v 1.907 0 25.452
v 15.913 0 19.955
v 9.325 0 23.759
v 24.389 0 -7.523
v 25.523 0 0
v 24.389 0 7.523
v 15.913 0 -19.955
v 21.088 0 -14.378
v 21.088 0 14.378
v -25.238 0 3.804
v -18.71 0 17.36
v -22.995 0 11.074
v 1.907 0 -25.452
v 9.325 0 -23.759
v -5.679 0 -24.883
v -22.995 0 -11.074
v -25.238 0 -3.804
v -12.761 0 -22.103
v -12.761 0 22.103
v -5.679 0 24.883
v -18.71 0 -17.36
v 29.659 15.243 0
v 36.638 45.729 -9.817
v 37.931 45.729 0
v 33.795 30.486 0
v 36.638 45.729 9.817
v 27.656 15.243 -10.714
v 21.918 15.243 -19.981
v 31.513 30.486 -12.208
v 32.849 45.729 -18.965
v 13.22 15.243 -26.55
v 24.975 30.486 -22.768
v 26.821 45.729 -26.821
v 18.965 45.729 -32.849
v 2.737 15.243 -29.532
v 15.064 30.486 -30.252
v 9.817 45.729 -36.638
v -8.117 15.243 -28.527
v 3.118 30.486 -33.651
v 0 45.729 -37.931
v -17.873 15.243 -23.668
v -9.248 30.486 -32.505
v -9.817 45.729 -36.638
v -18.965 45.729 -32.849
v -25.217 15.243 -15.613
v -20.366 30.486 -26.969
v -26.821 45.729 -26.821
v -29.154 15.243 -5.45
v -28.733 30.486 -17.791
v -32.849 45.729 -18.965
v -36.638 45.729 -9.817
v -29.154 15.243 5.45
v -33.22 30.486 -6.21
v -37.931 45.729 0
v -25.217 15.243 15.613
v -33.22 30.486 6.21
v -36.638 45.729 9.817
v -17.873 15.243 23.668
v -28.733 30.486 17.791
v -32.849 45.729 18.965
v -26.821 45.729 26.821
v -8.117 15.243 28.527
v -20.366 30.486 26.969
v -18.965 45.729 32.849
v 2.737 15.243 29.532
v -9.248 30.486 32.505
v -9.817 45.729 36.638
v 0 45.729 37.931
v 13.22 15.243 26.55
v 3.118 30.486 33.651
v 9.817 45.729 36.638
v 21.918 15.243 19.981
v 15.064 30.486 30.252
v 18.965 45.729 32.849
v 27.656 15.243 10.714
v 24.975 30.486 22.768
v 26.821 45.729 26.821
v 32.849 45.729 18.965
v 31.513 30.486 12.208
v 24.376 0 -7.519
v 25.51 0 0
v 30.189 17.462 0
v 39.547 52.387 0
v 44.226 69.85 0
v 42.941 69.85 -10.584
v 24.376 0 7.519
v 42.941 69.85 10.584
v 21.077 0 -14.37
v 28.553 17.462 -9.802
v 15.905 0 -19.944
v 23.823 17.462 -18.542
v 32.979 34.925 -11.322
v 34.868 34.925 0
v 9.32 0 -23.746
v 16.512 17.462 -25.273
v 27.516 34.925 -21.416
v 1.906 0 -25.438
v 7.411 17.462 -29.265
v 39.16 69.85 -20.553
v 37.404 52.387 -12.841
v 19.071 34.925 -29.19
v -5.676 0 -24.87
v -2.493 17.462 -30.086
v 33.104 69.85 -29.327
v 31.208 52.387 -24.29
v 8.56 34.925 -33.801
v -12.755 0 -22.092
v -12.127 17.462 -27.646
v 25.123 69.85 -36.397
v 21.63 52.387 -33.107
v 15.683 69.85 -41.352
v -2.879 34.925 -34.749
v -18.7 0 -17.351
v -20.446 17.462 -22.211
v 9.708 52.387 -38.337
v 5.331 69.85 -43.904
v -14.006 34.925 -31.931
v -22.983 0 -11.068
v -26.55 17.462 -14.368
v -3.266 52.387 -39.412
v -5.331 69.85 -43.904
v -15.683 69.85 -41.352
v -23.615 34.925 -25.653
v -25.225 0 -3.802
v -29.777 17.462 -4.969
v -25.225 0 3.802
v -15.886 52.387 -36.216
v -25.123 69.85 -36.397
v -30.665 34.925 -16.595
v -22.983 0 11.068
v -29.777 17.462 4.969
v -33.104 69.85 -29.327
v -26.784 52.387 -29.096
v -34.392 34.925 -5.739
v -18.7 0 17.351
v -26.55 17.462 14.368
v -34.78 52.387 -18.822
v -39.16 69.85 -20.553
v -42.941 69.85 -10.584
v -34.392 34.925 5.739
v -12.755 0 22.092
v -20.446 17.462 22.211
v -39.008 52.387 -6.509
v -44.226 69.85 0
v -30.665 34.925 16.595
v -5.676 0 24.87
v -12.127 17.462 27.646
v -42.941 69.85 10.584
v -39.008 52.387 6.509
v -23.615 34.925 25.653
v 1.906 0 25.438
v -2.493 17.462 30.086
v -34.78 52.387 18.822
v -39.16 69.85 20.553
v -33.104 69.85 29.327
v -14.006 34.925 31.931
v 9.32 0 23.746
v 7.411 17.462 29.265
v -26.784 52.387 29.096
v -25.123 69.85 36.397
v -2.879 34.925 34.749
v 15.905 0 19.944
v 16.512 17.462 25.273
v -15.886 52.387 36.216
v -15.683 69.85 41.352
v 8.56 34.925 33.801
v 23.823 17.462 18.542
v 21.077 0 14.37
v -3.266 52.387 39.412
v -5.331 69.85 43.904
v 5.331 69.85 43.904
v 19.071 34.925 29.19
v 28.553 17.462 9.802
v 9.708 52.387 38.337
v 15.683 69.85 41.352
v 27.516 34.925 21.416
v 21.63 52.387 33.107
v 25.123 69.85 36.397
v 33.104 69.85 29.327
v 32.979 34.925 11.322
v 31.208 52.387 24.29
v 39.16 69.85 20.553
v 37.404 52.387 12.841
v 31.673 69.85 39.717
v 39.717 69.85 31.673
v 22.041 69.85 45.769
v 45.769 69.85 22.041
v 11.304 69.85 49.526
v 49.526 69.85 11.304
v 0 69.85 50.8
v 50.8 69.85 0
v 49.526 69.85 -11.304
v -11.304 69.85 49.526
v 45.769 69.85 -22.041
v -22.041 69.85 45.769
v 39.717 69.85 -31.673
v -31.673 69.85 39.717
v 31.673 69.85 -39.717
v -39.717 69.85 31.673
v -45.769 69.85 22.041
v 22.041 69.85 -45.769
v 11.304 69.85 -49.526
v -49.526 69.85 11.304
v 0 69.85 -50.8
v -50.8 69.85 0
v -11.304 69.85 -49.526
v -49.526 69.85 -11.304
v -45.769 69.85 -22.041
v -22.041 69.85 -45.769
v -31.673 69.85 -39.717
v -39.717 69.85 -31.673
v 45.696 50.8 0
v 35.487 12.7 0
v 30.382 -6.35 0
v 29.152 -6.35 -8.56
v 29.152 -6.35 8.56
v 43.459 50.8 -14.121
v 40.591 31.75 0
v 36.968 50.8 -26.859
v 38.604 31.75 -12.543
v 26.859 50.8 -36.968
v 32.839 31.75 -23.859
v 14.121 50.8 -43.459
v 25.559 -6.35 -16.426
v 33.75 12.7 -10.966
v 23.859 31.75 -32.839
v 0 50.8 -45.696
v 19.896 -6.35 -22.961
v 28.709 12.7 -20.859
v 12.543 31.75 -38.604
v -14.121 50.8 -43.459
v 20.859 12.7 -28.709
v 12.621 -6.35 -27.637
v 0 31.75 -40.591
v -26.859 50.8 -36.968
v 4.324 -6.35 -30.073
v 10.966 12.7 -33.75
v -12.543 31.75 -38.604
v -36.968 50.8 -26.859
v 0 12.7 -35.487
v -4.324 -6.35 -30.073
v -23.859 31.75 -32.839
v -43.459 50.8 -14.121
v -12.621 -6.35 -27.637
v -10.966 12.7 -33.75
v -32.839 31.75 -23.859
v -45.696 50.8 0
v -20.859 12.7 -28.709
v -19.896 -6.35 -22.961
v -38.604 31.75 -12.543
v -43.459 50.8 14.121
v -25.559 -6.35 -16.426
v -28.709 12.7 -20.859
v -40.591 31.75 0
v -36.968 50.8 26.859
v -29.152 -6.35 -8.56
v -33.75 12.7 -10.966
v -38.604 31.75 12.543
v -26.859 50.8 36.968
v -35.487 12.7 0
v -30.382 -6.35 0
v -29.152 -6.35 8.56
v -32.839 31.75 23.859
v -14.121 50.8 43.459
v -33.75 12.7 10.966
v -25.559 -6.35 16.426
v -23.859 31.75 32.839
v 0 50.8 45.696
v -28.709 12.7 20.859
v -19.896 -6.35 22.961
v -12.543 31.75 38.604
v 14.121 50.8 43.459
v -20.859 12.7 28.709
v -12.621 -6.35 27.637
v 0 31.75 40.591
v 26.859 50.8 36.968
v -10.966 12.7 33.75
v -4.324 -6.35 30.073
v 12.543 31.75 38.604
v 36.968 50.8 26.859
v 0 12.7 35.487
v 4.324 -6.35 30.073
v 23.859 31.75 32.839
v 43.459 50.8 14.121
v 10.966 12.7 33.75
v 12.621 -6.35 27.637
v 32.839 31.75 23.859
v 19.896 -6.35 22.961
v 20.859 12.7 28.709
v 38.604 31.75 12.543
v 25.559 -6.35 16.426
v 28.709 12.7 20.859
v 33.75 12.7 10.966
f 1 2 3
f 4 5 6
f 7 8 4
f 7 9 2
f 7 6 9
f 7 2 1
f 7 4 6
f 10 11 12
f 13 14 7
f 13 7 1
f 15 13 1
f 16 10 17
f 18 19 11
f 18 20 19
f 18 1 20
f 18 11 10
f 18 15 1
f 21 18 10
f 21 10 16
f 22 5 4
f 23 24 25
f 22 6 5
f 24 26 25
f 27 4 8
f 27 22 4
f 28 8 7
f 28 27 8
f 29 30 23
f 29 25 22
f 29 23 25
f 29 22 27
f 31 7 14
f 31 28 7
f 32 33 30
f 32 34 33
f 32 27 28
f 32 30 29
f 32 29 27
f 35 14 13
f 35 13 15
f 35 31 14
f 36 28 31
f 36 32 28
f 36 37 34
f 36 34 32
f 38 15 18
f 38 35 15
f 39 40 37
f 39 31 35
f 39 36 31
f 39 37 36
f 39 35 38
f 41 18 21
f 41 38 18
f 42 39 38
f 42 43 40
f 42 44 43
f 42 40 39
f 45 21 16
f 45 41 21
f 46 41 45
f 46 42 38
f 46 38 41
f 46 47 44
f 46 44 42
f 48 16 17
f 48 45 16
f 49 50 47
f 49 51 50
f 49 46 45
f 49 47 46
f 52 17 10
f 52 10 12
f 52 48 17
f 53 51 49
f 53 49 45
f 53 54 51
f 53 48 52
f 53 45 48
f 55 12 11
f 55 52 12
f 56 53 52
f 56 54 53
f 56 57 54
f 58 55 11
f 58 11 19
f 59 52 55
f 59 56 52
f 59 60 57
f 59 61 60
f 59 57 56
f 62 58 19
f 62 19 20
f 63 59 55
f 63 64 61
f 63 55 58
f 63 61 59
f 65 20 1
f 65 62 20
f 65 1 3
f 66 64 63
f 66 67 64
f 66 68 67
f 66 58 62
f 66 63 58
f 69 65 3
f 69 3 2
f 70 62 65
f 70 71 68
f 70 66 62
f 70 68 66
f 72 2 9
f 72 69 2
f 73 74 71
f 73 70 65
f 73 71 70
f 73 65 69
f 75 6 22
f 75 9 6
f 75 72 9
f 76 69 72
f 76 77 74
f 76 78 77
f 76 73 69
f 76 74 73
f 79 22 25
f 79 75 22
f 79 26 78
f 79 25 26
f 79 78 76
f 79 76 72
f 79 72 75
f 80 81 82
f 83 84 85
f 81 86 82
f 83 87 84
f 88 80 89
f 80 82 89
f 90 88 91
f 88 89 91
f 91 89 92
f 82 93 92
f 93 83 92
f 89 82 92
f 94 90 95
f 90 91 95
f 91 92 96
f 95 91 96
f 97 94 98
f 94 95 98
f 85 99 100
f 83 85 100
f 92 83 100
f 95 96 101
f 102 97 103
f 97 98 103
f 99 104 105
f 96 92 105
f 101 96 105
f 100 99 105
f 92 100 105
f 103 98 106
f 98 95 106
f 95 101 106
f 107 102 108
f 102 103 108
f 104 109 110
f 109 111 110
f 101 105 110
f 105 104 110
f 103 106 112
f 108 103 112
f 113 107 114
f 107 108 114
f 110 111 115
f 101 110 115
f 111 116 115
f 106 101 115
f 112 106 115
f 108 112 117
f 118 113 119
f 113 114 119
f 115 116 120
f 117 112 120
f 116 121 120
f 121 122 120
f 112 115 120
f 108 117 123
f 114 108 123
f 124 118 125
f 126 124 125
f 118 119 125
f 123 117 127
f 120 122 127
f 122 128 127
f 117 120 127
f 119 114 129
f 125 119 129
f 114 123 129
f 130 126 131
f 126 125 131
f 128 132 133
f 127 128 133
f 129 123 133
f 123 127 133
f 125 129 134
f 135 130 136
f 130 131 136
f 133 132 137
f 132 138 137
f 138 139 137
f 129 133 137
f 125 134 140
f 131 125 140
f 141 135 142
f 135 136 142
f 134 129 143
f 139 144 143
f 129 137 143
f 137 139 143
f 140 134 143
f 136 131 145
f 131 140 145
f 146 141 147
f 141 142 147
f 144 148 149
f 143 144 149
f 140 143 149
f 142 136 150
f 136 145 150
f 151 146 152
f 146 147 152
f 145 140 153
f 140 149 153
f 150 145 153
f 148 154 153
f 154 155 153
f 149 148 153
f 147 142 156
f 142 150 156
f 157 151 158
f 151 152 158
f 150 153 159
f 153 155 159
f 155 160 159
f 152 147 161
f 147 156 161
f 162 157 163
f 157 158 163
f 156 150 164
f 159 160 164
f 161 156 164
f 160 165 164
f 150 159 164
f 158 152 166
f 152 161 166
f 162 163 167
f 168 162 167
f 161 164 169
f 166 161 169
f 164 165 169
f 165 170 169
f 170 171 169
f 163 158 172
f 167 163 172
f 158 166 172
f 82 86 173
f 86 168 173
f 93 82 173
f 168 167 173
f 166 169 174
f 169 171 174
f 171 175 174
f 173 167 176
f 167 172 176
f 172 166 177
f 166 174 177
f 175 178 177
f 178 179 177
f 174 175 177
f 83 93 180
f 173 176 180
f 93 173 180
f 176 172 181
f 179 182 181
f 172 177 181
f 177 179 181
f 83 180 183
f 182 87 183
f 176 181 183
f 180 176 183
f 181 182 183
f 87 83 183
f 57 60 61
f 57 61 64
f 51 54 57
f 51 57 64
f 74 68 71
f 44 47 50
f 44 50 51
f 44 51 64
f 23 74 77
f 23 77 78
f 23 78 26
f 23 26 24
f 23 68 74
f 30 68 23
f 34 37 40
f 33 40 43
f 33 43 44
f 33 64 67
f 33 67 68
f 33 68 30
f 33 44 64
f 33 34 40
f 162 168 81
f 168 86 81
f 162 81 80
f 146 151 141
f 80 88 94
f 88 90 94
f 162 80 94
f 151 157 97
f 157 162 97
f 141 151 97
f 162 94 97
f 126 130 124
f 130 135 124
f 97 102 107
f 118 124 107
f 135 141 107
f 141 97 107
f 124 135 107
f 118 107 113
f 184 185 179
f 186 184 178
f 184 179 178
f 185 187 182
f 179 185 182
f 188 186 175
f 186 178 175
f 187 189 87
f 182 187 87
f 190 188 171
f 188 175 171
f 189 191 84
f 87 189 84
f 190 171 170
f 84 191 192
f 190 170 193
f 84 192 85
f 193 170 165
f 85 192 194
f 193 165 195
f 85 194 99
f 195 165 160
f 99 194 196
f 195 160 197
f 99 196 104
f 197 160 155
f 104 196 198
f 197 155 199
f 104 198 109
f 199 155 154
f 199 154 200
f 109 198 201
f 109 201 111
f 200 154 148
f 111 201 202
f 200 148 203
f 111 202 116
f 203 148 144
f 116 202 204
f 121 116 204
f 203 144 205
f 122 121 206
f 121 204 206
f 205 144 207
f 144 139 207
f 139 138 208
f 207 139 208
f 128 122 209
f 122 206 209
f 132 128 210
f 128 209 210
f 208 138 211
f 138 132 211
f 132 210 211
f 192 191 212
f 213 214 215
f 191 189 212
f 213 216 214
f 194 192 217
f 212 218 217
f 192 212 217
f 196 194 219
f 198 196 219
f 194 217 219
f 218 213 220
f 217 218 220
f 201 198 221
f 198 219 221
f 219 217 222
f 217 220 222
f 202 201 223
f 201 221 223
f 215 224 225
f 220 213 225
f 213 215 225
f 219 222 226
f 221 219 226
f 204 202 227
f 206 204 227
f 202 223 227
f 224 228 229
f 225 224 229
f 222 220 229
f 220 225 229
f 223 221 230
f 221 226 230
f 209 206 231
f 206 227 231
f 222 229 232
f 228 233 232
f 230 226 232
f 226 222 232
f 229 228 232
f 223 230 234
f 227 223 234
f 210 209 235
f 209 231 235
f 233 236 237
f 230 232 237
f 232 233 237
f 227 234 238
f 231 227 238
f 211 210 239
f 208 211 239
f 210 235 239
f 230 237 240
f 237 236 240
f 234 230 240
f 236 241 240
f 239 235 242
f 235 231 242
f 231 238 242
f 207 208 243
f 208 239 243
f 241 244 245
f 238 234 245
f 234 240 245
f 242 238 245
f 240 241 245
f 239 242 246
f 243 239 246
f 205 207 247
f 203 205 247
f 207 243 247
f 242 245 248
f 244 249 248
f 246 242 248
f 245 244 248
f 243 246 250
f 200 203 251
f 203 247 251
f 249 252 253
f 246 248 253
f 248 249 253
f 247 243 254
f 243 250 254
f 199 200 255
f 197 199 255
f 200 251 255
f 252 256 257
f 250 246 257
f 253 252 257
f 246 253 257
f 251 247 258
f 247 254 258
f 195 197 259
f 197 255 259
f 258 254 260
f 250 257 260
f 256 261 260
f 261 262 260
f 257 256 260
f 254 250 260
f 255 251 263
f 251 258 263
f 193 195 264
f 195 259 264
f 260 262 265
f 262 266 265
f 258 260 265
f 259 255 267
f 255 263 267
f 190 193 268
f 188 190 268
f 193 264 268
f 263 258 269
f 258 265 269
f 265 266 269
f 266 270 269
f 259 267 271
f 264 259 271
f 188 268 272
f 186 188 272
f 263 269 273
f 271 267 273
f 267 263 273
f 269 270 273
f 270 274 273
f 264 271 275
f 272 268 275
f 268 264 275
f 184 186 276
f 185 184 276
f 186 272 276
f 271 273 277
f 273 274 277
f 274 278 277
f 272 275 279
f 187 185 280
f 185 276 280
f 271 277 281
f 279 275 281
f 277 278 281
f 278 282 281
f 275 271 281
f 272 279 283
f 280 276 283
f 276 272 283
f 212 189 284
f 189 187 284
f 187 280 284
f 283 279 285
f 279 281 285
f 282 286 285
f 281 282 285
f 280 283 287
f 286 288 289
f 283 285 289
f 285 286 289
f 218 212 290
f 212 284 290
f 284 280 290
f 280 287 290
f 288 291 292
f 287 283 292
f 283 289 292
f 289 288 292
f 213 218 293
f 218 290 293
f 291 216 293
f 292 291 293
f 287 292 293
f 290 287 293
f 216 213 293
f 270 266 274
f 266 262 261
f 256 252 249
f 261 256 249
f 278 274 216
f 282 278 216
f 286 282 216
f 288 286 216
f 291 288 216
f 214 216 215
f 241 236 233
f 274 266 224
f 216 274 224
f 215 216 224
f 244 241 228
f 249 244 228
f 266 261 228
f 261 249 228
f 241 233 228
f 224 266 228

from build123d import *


with BuildPart() as part:
    # Sketch1 → Revolve1 (revolve)
    with BuildSketch(Plane.XY):
        Polygon((0, 0), (25.509745163, 0), (44.225996254, 69.85), (50.8, 69.85), (30.382271537, -6.35), (0, -6.35), align=None)
    revolve(axis=Axis((0, 0, 0), (0, 1, 0)))


with BuildPart() as body_2:
    # Sketch2 → Revolve2 (revolve)
    with BuildSketch(Plane.XY):
        Polygon((0, 0), (25.522903868, 0), (37.930961748, 45.728698118), (0, 45.728698118), align=None)
    revolve(axis=Axis((0, 0, 0), (0, 1, 0)))


solid = Compound([part.part, body_2.part])
